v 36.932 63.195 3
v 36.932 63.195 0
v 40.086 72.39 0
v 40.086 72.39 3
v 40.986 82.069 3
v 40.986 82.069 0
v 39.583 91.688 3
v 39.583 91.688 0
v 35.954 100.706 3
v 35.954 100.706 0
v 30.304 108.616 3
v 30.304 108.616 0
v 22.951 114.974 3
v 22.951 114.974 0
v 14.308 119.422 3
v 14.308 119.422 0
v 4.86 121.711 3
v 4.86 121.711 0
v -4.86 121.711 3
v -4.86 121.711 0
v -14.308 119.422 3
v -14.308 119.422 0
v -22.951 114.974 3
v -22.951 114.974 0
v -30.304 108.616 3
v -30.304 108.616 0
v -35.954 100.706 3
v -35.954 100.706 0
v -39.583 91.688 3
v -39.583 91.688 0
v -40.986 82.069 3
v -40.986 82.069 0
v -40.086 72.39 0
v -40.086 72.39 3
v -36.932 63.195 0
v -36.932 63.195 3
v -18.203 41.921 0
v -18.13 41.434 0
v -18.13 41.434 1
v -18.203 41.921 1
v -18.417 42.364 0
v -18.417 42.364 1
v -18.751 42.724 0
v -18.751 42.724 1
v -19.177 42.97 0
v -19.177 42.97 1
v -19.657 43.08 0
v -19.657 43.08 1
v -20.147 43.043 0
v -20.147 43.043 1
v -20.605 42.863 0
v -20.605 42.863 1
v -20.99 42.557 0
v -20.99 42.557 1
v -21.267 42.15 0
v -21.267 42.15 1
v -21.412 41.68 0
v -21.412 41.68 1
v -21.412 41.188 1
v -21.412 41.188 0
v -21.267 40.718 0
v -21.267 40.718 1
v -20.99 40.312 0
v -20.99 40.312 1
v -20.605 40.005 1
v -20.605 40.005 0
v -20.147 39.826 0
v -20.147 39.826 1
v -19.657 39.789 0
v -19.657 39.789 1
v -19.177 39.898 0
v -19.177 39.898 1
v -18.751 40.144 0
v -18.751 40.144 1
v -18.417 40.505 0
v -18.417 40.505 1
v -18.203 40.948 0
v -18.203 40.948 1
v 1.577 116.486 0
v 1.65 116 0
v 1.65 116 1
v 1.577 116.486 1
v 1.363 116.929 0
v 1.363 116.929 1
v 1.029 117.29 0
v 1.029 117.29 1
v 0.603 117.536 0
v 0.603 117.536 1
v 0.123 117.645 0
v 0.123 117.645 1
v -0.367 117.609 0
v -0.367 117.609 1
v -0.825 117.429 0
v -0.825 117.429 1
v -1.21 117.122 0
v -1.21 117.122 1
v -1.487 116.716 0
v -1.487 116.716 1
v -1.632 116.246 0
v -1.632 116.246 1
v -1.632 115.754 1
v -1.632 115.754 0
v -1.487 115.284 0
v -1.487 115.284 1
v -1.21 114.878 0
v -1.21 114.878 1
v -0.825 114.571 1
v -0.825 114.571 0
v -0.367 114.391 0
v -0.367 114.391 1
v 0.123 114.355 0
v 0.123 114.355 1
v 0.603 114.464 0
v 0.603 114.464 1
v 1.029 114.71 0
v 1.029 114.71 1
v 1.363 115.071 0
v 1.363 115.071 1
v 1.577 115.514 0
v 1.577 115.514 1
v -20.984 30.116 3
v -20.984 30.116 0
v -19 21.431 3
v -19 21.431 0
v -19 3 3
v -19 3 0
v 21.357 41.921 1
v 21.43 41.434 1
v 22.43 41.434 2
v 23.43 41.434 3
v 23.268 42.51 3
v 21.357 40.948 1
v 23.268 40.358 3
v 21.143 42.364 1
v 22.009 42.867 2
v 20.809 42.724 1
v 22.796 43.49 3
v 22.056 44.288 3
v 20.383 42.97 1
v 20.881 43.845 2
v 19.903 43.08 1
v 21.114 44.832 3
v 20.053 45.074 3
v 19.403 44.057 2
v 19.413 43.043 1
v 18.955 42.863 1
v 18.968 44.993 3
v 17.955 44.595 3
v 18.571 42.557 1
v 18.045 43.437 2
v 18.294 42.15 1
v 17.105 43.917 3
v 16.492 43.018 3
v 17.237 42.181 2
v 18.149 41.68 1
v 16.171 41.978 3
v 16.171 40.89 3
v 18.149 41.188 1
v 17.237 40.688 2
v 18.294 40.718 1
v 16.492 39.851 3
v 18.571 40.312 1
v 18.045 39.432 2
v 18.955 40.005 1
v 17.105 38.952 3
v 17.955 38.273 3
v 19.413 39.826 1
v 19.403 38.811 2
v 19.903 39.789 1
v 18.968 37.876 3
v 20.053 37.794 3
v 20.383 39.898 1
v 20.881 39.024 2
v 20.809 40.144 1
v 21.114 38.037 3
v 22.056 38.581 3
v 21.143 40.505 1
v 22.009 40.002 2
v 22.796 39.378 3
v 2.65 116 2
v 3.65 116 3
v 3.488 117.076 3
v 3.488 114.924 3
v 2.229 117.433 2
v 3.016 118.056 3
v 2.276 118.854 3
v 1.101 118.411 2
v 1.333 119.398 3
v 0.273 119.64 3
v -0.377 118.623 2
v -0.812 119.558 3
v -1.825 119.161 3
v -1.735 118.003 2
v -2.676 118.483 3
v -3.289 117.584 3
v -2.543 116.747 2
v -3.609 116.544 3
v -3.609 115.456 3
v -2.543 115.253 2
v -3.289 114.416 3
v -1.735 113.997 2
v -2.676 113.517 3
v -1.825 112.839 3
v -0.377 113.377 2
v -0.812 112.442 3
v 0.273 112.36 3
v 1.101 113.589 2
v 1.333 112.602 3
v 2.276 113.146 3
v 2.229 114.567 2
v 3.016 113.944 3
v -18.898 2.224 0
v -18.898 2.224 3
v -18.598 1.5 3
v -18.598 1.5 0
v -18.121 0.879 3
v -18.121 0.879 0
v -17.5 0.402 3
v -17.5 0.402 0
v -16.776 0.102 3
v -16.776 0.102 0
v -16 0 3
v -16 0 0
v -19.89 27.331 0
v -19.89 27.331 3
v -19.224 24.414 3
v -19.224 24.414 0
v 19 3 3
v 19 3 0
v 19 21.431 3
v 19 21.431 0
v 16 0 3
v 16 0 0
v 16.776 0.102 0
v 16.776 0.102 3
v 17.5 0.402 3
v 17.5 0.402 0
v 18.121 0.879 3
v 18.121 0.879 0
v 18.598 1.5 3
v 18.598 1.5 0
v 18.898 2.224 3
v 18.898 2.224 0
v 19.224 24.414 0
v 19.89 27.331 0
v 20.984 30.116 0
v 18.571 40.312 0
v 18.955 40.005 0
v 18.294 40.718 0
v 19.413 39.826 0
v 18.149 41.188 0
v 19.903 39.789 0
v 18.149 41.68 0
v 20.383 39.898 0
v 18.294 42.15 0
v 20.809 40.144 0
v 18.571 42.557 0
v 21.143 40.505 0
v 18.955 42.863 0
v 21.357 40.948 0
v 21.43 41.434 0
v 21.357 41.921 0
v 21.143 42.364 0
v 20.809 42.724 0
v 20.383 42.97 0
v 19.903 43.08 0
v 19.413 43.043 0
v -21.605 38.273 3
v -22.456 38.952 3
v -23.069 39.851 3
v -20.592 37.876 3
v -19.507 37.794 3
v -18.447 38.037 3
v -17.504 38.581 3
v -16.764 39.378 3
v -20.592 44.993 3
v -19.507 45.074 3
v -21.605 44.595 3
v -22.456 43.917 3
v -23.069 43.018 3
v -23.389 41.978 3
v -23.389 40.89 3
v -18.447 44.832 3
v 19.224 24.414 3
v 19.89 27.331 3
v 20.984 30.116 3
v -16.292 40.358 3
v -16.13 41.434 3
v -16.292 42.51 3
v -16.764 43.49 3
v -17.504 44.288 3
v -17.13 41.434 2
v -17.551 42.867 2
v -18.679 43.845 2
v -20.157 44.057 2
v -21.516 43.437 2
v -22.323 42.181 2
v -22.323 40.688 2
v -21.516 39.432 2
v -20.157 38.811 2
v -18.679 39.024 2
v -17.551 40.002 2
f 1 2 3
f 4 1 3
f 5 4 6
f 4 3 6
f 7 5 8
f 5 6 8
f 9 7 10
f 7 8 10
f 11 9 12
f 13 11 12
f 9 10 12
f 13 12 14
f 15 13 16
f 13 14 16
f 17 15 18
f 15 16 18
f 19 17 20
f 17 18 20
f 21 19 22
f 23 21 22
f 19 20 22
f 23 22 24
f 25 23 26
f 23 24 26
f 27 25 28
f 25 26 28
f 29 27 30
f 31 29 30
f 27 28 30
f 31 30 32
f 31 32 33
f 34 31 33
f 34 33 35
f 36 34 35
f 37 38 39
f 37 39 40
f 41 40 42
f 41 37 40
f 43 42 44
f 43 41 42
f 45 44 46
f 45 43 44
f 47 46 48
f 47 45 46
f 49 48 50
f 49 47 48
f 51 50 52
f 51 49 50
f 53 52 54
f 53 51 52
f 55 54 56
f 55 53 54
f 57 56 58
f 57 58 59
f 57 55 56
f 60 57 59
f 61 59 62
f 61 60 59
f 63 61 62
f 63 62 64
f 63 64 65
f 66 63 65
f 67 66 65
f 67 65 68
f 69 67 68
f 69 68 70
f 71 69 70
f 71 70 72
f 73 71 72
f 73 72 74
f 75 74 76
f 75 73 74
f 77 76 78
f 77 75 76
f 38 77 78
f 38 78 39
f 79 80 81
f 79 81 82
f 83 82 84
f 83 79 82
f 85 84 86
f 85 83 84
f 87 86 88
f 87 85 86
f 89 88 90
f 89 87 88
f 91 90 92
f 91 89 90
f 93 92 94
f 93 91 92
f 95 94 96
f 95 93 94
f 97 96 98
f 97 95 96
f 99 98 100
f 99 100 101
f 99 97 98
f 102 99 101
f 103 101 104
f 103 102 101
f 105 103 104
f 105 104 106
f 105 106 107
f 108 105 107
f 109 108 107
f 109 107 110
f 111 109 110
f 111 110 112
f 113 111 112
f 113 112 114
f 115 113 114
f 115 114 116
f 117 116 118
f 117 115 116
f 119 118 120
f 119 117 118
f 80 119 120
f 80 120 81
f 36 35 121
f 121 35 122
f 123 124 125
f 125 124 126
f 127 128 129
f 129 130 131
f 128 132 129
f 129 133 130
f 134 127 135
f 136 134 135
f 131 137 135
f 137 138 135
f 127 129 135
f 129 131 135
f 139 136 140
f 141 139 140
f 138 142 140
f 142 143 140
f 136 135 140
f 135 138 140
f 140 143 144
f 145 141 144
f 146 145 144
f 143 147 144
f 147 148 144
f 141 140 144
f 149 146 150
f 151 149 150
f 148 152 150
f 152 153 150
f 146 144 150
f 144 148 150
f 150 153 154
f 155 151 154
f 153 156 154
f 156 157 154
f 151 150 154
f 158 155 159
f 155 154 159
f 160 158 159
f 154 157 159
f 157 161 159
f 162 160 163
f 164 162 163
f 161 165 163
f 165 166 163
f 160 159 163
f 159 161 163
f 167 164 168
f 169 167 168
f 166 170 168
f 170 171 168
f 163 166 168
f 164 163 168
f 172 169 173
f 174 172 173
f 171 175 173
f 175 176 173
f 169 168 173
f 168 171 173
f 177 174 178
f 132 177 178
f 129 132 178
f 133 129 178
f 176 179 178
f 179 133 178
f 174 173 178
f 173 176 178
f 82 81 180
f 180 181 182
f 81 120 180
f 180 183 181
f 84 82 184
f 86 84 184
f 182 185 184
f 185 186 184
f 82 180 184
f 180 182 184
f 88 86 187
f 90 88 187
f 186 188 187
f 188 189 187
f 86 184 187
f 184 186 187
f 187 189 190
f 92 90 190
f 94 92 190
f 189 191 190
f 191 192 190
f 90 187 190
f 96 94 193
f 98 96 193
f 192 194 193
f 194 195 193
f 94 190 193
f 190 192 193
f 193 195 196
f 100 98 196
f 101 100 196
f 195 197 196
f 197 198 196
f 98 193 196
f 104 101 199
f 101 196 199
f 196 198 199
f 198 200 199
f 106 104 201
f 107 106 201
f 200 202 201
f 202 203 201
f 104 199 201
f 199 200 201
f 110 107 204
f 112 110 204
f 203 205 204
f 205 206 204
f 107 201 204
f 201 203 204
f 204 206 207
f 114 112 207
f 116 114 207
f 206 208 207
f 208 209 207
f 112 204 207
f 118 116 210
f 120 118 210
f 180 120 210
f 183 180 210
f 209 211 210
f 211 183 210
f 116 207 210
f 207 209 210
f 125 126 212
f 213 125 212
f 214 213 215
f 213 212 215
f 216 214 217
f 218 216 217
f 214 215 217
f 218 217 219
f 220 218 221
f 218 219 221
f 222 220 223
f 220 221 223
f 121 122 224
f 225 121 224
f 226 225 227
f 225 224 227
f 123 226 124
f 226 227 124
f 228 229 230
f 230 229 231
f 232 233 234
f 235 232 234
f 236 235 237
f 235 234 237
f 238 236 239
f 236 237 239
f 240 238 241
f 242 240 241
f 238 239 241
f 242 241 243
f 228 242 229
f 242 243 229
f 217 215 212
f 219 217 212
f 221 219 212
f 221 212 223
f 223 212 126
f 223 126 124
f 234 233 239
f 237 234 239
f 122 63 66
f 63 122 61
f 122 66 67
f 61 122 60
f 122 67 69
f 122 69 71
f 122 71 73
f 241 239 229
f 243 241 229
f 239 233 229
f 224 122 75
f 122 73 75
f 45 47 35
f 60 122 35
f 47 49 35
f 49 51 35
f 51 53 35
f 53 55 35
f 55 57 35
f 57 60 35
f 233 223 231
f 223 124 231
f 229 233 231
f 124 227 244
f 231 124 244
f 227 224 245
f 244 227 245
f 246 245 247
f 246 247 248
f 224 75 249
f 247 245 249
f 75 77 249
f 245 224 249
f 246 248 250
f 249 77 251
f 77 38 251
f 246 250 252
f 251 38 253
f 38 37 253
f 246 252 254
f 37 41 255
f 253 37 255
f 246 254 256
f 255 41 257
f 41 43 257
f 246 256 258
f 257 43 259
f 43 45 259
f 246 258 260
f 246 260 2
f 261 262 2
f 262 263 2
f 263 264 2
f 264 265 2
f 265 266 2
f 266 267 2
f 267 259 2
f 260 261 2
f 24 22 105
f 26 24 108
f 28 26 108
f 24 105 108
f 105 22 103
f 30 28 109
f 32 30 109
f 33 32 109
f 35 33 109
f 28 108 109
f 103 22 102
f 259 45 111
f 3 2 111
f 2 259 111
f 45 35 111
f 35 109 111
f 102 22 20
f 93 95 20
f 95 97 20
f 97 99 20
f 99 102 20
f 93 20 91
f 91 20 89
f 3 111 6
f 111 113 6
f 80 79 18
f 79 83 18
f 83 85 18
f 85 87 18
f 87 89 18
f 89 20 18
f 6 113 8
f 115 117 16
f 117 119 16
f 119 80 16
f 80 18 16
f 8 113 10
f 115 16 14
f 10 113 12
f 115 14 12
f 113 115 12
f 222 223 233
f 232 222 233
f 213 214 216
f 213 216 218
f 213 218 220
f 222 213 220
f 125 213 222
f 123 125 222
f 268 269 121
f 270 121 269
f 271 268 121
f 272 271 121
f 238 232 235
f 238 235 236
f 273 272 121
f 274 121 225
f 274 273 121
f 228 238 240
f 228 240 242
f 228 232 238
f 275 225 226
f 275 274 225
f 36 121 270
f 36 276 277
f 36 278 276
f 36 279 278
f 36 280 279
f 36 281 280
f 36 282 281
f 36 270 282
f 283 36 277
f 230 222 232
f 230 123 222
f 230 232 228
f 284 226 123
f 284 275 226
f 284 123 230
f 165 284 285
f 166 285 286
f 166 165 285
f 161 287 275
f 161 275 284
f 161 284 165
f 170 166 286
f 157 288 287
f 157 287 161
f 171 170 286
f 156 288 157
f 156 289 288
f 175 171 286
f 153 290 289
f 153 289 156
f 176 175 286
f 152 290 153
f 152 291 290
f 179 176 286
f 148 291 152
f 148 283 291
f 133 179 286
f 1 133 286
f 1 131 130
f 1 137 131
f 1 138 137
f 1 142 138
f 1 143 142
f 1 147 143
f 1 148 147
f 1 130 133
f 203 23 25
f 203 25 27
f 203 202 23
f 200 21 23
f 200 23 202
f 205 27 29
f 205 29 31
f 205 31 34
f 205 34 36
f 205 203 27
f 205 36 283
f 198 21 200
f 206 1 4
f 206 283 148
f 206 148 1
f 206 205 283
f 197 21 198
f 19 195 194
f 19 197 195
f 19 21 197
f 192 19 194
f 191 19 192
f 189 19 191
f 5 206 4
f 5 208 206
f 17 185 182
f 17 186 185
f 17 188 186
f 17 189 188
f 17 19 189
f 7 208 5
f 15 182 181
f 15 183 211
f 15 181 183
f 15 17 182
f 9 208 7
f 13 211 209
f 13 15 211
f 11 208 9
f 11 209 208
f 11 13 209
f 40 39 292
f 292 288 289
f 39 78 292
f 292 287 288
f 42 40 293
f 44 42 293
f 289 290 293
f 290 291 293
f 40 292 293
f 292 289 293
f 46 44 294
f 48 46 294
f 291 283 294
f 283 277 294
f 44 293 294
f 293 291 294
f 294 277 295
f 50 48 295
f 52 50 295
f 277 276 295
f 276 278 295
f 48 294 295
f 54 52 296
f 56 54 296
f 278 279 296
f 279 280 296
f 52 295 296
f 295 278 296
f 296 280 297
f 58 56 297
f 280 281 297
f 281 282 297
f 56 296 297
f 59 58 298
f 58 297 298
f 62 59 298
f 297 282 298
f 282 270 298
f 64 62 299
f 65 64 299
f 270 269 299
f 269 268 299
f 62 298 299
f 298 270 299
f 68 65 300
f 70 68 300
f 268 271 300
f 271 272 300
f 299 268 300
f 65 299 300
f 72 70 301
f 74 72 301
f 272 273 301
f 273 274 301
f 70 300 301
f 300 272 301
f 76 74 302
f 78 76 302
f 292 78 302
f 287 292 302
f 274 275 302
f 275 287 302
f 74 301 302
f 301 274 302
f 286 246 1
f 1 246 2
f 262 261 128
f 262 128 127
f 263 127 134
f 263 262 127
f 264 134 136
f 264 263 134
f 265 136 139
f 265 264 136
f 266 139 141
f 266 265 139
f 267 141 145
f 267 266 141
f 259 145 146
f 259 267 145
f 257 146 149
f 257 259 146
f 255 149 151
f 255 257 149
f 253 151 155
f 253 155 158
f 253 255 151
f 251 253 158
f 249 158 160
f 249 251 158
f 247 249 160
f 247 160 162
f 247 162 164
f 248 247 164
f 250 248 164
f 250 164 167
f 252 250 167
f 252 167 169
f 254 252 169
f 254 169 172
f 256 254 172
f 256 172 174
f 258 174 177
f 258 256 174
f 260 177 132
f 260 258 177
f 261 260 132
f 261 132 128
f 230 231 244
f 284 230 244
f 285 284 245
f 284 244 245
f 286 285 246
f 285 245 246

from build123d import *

# Parameters (mm, degrees)
ESQUISSE1_R        = 1.65
BOSS_EXTRU_1_DEPTH = 3
CHANFREIN1_SIZE    = 2


with BuildPart() as part:
    # Esquisse1 → Boss.-Extru.1 (new body)
    with BuildSketch(Plane.XY):
        with BuildLine():
            Line((-16, 0), (16, 0))
            ThreePointArc((16, 0), (18.121320344, 0.878679656), (19, 3))
            Line((19, 3), (19, 21.430548548))
            ThreePointArc((19, 21.430548548), (19.502411268, 25.885212805), (20.984403364, 30.11606971))
            Line((20.984403364, 30.11606971), (36.931973103, 63.194681617))
            ThreePointArc((36.931973103, 63.194681617), (0, 122), (-36.931973103, 63.194681617))
            Line((-36.931973103, 63.194681617), (-20.984403364, 30.11606971))
            ThreePointArc((-20.984403364, 30.11606971), (-19.502411268, 25.885212805), (-19, 21.430548548))
            Line((-19, 21.430548548), (-19, 3))
            ThreePointArc((-19, 3), (-18.121320344, 0.878679656), (-16, 0))
        make_face()
        with Locations((0, 116)):
            Circle(ESQUISSE1_R, mode=Mode.SUBTRACT)
        with Locations((19.780142429, 41.434276058)):
            Circle(ESQUISSE1_R, mode=Mode.SUBTRACT)
        with Locations((-19.780142429, 41.434276058)):
            Circle(ESQUISSE1_R, mode=Mode.SUBTRACT)
    extrude(amount=BOSS_EXTRU_1_DEPTH)

    # Chanfrein1
    chanfrein1_edges = [part.edges().sort_by_distance(p)[0] for p in [
        (-1.65, 116, 3),
        (18.130142429, 41.434276058, 3),
        (-21.430142429, 41.434276058, 3),
    ]]
    chamfer(chanfrein1_edges, length=CHANFREIN1_SIZE)


solid = part.part
